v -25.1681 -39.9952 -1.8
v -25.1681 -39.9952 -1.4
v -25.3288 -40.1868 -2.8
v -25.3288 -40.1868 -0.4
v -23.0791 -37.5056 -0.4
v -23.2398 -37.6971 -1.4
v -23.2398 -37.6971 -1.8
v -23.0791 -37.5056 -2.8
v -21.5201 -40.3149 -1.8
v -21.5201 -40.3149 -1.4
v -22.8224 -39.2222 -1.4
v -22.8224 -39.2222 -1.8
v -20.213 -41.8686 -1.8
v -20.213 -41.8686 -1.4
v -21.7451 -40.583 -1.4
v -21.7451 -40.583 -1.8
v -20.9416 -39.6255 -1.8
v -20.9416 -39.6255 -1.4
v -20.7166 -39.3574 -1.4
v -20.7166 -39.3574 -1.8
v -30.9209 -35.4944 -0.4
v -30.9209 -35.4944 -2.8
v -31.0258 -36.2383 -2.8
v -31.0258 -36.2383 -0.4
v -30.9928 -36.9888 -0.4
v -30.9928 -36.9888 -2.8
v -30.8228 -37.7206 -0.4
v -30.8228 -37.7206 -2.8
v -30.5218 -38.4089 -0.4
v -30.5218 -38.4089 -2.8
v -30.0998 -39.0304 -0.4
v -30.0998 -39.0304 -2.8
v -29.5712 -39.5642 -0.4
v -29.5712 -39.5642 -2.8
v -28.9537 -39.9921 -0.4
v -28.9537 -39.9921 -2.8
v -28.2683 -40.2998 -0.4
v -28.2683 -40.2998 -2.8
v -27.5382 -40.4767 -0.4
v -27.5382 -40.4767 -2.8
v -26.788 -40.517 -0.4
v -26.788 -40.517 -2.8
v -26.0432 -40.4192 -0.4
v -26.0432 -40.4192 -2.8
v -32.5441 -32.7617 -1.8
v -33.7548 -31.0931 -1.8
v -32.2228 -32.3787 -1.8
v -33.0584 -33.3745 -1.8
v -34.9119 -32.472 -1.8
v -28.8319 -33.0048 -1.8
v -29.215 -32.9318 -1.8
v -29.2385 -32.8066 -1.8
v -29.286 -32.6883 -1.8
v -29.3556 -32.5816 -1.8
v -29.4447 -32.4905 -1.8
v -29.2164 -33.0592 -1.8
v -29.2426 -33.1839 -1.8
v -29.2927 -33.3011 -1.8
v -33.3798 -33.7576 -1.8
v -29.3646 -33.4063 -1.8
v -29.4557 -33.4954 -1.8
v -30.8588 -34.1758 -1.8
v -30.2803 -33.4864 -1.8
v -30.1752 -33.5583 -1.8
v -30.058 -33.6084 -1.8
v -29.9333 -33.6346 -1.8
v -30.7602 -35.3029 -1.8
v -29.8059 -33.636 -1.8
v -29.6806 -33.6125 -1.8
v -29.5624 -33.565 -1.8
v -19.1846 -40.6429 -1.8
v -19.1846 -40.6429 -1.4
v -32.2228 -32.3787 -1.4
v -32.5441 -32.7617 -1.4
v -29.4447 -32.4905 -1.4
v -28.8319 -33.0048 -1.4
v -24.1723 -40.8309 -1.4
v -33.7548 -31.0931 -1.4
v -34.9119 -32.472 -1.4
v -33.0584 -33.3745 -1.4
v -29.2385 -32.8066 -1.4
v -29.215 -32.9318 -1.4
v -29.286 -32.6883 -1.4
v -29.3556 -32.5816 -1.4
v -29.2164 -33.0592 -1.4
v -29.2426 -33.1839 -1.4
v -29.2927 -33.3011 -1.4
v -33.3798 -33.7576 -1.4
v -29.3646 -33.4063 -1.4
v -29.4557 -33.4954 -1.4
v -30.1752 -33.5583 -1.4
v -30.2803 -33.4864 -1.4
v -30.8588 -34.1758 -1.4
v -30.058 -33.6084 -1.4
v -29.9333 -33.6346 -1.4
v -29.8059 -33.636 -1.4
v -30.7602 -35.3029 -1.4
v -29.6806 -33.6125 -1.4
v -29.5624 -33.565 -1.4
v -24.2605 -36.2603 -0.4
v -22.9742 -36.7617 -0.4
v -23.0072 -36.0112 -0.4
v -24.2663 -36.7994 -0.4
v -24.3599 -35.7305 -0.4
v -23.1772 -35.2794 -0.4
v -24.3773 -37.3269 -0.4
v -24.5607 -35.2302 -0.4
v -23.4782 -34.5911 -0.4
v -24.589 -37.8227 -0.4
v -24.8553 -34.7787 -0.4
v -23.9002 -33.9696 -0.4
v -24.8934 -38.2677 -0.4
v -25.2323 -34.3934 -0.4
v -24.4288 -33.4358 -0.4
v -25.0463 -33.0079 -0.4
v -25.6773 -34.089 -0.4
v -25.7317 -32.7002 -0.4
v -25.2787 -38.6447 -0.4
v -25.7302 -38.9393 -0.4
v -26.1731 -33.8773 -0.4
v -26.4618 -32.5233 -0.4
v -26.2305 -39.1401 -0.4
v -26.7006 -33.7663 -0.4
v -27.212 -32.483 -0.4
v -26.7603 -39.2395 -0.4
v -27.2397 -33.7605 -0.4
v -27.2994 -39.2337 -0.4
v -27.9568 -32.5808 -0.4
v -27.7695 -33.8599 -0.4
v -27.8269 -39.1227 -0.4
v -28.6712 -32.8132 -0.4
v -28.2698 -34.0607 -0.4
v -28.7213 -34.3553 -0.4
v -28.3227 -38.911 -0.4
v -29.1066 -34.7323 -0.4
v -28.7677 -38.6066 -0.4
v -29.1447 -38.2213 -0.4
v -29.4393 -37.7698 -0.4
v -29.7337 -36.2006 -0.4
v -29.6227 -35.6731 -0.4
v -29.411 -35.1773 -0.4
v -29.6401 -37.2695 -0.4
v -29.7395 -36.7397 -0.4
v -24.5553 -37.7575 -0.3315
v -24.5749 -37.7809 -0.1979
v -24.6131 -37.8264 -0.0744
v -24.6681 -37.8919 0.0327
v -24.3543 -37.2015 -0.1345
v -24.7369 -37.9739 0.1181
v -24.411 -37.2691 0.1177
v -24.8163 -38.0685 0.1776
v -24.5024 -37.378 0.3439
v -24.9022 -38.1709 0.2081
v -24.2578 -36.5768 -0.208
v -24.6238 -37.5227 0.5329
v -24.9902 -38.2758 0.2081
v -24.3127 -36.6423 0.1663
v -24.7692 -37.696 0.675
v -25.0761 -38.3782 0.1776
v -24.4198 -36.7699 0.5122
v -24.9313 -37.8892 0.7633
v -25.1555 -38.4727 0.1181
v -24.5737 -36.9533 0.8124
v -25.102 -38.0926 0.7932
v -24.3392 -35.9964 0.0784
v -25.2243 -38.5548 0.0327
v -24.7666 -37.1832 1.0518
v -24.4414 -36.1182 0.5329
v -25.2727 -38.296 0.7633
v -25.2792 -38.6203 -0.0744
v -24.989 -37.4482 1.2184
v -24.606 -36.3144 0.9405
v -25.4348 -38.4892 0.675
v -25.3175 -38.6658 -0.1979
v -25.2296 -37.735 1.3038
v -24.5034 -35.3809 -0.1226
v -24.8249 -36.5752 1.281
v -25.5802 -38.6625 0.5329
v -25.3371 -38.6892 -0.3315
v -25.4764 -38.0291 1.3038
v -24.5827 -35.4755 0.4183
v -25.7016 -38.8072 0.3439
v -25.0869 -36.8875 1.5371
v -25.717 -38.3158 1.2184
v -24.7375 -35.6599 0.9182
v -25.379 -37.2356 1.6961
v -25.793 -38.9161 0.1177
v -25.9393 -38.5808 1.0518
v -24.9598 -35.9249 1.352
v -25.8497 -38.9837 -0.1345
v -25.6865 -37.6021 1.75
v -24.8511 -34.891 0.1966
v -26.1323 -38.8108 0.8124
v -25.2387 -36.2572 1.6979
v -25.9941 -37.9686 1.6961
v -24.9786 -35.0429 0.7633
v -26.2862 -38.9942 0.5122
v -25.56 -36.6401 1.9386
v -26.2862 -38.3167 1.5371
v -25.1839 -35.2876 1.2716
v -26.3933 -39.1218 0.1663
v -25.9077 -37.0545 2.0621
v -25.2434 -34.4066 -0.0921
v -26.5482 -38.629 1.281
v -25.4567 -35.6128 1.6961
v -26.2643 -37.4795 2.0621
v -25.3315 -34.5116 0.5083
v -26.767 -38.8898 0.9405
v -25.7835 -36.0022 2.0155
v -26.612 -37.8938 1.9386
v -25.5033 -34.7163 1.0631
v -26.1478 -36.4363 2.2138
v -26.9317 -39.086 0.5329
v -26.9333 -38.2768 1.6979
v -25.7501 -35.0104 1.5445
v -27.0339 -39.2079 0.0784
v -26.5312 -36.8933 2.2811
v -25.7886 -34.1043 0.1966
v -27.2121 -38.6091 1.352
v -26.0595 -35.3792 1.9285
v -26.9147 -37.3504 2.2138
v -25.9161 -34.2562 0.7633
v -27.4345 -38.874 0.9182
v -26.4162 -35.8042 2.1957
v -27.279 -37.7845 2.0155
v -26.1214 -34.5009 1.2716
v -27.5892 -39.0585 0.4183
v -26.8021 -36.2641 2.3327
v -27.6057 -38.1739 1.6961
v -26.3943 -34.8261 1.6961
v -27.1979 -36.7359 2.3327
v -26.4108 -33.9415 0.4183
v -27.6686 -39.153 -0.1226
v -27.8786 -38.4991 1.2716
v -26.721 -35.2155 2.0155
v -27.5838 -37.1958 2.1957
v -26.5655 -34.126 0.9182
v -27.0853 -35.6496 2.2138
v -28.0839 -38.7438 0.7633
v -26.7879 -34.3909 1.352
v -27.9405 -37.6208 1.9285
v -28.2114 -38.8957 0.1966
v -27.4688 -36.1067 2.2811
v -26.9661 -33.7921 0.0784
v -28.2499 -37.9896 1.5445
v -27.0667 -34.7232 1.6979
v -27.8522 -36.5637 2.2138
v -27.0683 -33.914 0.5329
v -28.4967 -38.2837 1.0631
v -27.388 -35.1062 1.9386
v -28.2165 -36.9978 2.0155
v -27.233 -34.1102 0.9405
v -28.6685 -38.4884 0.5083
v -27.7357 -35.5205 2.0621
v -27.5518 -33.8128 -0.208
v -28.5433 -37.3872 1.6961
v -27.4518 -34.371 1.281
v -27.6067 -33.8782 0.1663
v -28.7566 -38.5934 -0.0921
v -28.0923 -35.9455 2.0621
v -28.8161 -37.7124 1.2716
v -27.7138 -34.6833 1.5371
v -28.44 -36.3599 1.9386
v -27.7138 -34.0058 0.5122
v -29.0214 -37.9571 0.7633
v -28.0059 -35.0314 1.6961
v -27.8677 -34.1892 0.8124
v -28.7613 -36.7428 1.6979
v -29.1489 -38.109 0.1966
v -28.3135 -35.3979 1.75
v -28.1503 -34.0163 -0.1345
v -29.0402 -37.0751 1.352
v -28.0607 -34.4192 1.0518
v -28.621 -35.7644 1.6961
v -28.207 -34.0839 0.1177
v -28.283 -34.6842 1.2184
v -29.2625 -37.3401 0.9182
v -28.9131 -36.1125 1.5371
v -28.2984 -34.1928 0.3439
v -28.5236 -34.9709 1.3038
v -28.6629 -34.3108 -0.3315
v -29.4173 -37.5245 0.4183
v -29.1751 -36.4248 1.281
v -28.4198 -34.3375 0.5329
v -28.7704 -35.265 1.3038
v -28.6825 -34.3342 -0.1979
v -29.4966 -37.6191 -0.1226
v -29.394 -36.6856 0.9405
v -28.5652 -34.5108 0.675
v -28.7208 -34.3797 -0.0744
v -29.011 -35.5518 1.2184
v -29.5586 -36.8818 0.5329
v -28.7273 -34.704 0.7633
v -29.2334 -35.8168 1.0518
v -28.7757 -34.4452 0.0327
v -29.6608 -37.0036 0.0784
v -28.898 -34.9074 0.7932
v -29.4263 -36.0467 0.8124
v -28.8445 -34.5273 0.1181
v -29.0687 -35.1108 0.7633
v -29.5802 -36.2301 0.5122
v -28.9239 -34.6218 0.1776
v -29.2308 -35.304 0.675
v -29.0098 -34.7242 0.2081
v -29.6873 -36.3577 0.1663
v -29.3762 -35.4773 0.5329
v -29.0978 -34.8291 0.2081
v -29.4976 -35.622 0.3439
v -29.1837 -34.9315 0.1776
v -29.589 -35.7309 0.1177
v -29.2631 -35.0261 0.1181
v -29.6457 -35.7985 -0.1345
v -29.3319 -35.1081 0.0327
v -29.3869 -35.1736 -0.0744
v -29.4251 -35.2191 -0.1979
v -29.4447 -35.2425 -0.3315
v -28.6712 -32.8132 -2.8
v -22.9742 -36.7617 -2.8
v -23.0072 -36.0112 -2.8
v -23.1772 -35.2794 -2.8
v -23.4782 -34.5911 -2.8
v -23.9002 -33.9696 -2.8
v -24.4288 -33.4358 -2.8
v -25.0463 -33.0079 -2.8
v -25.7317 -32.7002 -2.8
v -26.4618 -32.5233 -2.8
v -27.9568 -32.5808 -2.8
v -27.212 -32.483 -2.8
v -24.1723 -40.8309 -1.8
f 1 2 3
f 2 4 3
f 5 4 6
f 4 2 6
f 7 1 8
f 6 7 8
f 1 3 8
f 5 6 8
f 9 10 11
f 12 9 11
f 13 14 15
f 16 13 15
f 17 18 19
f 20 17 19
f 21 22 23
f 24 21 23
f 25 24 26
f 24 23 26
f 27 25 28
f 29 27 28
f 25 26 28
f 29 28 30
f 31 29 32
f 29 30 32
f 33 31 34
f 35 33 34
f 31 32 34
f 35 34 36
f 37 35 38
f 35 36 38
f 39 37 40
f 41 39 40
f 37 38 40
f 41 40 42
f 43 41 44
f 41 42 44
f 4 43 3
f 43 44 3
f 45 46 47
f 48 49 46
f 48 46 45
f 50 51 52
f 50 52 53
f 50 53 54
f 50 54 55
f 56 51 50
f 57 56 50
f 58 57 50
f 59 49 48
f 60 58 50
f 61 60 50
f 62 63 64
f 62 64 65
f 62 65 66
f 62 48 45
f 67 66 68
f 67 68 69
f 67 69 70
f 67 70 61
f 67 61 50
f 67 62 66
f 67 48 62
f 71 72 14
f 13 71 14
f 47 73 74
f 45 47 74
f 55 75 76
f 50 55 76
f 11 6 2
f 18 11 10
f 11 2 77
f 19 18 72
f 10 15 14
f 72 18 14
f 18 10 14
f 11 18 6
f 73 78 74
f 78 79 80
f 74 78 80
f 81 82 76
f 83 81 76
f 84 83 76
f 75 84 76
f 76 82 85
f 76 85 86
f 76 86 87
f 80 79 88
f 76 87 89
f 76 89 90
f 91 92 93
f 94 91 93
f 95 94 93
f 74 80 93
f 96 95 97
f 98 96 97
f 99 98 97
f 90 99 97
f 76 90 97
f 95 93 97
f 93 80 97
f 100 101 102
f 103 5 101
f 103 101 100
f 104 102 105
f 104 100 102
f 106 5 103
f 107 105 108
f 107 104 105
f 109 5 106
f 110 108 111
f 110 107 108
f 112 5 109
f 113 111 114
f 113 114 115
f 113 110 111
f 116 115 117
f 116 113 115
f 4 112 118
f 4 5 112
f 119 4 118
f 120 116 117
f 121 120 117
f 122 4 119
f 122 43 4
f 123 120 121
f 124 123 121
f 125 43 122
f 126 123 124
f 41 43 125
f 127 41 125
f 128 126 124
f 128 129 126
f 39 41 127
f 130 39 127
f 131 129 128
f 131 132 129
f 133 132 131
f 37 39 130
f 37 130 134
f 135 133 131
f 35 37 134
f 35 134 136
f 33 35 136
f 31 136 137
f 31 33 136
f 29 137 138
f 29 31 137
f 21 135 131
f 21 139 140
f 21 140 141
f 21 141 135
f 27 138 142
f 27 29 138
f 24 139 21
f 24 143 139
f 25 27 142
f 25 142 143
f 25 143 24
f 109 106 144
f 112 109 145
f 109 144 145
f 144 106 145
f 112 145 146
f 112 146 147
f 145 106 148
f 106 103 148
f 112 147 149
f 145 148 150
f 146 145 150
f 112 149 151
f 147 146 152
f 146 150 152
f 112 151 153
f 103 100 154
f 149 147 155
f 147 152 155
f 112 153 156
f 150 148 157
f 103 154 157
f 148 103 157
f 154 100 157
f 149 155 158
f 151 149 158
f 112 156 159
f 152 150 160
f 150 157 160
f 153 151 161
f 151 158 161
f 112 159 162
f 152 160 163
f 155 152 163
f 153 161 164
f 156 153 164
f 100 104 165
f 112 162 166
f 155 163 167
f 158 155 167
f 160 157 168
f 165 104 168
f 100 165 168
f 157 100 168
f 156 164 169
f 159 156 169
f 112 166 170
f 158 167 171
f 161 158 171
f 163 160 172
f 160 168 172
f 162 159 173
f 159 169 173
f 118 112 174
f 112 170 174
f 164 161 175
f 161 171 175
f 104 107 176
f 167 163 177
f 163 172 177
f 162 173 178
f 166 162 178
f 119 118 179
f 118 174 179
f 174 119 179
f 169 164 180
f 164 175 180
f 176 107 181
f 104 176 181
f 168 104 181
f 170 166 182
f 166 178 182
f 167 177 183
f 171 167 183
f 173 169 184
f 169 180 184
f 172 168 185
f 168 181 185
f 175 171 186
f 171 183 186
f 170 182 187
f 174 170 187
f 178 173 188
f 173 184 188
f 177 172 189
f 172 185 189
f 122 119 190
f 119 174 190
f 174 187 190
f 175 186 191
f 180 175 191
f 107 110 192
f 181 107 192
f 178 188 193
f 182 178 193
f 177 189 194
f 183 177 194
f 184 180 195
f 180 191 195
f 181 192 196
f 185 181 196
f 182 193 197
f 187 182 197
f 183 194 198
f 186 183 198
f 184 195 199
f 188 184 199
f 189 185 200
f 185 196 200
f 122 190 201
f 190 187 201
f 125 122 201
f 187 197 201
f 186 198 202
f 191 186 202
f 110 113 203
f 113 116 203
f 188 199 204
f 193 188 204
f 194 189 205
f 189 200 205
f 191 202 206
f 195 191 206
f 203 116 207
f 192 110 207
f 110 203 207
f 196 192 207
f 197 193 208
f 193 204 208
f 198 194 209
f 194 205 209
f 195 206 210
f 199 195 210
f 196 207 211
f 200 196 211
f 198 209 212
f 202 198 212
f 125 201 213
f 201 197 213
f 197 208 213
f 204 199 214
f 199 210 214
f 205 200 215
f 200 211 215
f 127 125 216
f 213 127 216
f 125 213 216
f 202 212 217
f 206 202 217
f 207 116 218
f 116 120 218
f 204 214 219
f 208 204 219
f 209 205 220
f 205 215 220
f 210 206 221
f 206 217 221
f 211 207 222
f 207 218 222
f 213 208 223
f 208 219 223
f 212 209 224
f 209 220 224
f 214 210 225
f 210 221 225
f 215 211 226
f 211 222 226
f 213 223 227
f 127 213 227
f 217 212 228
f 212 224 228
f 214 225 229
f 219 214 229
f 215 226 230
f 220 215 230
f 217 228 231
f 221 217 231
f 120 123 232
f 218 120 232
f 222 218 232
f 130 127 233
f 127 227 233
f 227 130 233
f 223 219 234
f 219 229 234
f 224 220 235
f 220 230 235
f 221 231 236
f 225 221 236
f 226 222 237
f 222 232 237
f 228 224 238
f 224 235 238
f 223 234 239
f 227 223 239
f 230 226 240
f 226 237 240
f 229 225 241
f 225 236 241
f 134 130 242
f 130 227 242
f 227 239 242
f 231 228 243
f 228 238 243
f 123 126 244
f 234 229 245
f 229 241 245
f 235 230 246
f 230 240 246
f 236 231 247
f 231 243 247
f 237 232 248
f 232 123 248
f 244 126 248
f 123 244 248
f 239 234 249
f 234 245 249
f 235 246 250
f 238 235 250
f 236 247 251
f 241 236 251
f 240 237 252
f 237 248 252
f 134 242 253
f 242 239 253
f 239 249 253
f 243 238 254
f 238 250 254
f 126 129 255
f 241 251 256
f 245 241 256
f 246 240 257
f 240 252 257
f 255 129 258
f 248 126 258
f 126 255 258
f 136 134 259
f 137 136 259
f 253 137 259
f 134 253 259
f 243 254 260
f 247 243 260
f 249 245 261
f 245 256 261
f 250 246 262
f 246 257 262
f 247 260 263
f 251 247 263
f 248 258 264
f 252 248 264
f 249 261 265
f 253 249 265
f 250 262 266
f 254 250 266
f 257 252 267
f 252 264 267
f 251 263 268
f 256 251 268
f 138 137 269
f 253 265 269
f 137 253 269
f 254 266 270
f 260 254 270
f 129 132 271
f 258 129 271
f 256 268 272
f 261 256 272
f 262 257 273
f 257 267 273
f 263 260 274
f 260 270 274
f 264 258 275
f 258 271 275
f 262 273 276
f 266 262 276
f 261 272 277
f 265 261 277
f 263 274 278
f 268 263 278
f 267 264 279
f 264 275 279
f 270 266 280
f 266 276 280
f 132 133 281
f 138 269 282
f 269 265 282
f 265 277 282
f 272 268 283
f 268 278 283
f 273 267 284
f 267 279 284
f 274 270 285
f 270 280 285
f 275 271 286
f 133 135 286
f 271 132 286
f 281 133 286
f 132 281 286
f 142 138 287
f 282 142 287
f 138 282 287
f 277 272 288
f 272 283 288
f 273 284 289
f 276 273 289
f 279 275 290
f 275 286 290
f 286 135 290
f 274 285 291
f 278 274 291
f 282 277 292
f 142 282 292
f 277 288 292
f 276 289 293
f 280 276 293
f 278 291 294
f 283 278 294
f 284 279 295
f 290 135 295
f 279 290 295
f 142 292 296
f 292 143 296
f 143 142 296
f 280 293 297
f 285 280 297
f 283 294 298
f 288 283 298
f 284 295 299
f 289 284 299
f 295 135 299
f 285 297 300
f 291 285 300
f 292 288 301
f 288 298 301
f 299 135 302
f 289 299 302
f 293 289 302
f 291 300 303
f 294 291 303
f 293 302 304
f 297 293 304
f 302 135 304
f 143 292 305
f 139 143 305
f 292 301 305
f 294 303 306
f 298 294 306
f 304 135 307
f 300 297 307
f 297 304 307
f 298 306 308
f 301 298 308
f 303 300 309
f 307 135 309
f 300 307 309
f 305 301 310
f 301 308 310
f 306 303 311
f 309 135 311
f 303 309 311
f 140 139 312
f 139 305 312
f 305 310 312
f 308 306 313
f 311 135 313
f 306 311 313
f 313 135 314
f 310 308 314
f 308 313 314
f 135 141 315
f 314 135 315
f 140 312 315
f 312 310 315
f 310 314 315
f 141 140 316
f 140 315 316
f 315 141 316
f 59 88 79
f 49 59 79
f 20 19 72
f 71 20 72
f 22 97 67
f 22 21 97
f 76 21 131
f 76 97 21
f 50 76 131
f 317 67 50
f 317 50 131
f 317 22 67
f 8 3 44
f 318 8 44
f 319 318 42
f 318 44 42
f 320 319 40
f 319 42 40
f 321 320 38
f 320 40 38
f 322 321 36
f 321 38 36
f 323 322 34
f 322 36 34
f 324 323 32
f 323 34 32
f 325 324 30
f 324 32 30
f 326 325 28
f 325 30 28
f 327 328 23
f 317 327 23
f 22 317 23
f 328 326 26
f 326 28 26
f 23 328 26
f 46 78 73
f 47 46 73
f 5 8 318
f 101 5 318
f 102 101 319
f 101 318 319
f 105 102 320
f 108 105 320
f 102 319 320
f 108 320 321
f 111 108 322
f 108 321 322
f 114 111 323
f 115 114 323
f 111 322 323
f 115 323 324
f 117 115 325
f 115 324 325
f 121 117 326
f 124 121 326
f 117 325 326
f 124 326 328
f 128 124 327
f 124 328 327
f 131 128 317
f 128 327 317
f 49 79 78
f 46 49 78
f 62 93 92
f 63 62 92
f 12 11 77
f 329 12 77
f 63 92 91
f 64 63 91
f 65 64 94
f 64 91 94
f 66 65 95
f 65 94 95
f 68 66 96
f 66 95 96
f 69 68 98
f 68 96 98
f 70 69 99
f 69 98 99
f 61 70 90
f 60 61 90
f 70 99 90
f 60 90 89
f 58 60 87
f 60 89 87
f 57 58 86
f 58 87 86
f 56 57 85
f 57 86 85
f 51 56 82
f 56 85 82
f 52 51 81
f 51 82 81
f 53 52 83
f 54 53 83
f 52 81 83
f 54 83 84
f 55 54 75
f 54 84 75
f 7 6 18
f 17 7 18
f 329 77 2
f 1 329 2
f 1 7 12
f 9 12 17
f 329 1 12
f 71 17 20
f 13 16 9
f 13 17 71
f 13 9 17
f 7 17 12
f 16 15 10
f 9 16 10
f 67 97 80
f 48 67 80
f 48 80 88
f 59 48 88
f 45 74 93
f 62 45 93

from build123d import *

# Parameters (mm, degrees)
REVOLUTION002_ANGLE       = -180
PAD017_DEPTH              = 0.4
BODY015_PLACEMENT_ANGLE   = 180
PAD016_DEPTH              = 2.4
FUSION003_PLACEMENT_ANGLE = 140


with BuildPart() as light002:
    # Sketch027 (on Face1 of ShapeBinder005) → Revolution002 (revolve)
    with BuildSketch(Plane.XY.offset(2.4)):
        with BuildLine():
            ThreePointArc((-2.75, 0), (0, -2.75), (2.75, 0))
            Line((-2.75, 0), (2.75, 0))
        make_face()
    revolve(axis=Axis((-2.75, 0, 2.4), (1, 0, 0)), revolution_arc=REVOLUTION002_ANGLE)


with BuildPart() as body015:
    # Sketch028 (on Face1 of ShapeBinder006) → Pad017 (new body)
    with BuildSketch(Plane(origin=(0, 0, 0), x_dir=(1, 0, 0), z_dir=(0, 0, -1))):
        with BuildLine():
            Line((3.65, 1.5), (6.65, 1.5))
            Line((6.65, 1.5), (6.65, 2))
            Line((6.65, 2), (8.65, 2))
            Line((8.65, 2), (8.65, 0.2))
            Line((8.65, 0.2), (6.65, 0.2))
            Line((6.65, 0.2), (6.65, 0.7))
            Line((6.65, 0.7), (4.45, 0.7))
            Line((4.45, 0.7), (4.45, -0.2))
            ThreePointArc((4.45, -0.2), (3.8, -0.85), (4.45, -1.5))
            Line((4.45, -1.5), (-6.65, -1.5))
            Line((-6.65, -1.5), (-6.65, -1.85))
            Line((-6.65, -1.85), (-8.65, -1.85))
            Line((-8.65, -1.85), (-8.65, -0.25))
            Line((-8.65, -0.25), (-6.65, -0.25))
            Line((-6.65, -0.25), (-6.65, -0.6))
            Line((-6.65, -0.6), (-4.95, -0.6))
            Line((-4.95, -0.6), (-4.95, 1.5))
            Line((-4.95, 1.5), (3.65, 1.5))
        make_face()
    extrude(amount=-PAD017_DEPTH)


with BuildPart() as body015_1:
    # Body015 placement: moved
    add(body015.part.moved(Location((0, 0, 1.4))).rotate(Axis((0, 0, 1.4), (1, 0, 0)), BODY015_PLACEMENT_ANGLE))


with BuildPart() as led3:
    # Sketch026 → Pad016 (new body)
    with BuildSketch(Plane.XY):
        with BuildLine():
            Line((-3.65, 1.75), (-3.65, -1.75))
            ThreePointArc((-3.65, -1.75), (0, -4), (3.65, -1.75))
            Line((3.65, 1.75), (3.65, -1.75))
            ThreePointArc((3.65, 1.75), (0, 4), (-3.65, 1.75))
        make_face()
    extrude(amount=PAD016_DEPTH)

    # Fusion003: union light002, Body015
    add(light002.part)
    add(body015_1.part)


with BuildPart() as led3_1:
    # Fusion003 placement: moved
    add(led3.part.moved(Location((-27, -36.5, -2.8))).rotate(Axis((-27, -36.5, -2.8), (0, 0, 1)), FUSION003_PLACEMENT_ANGLE))


solid = led3_1.part
